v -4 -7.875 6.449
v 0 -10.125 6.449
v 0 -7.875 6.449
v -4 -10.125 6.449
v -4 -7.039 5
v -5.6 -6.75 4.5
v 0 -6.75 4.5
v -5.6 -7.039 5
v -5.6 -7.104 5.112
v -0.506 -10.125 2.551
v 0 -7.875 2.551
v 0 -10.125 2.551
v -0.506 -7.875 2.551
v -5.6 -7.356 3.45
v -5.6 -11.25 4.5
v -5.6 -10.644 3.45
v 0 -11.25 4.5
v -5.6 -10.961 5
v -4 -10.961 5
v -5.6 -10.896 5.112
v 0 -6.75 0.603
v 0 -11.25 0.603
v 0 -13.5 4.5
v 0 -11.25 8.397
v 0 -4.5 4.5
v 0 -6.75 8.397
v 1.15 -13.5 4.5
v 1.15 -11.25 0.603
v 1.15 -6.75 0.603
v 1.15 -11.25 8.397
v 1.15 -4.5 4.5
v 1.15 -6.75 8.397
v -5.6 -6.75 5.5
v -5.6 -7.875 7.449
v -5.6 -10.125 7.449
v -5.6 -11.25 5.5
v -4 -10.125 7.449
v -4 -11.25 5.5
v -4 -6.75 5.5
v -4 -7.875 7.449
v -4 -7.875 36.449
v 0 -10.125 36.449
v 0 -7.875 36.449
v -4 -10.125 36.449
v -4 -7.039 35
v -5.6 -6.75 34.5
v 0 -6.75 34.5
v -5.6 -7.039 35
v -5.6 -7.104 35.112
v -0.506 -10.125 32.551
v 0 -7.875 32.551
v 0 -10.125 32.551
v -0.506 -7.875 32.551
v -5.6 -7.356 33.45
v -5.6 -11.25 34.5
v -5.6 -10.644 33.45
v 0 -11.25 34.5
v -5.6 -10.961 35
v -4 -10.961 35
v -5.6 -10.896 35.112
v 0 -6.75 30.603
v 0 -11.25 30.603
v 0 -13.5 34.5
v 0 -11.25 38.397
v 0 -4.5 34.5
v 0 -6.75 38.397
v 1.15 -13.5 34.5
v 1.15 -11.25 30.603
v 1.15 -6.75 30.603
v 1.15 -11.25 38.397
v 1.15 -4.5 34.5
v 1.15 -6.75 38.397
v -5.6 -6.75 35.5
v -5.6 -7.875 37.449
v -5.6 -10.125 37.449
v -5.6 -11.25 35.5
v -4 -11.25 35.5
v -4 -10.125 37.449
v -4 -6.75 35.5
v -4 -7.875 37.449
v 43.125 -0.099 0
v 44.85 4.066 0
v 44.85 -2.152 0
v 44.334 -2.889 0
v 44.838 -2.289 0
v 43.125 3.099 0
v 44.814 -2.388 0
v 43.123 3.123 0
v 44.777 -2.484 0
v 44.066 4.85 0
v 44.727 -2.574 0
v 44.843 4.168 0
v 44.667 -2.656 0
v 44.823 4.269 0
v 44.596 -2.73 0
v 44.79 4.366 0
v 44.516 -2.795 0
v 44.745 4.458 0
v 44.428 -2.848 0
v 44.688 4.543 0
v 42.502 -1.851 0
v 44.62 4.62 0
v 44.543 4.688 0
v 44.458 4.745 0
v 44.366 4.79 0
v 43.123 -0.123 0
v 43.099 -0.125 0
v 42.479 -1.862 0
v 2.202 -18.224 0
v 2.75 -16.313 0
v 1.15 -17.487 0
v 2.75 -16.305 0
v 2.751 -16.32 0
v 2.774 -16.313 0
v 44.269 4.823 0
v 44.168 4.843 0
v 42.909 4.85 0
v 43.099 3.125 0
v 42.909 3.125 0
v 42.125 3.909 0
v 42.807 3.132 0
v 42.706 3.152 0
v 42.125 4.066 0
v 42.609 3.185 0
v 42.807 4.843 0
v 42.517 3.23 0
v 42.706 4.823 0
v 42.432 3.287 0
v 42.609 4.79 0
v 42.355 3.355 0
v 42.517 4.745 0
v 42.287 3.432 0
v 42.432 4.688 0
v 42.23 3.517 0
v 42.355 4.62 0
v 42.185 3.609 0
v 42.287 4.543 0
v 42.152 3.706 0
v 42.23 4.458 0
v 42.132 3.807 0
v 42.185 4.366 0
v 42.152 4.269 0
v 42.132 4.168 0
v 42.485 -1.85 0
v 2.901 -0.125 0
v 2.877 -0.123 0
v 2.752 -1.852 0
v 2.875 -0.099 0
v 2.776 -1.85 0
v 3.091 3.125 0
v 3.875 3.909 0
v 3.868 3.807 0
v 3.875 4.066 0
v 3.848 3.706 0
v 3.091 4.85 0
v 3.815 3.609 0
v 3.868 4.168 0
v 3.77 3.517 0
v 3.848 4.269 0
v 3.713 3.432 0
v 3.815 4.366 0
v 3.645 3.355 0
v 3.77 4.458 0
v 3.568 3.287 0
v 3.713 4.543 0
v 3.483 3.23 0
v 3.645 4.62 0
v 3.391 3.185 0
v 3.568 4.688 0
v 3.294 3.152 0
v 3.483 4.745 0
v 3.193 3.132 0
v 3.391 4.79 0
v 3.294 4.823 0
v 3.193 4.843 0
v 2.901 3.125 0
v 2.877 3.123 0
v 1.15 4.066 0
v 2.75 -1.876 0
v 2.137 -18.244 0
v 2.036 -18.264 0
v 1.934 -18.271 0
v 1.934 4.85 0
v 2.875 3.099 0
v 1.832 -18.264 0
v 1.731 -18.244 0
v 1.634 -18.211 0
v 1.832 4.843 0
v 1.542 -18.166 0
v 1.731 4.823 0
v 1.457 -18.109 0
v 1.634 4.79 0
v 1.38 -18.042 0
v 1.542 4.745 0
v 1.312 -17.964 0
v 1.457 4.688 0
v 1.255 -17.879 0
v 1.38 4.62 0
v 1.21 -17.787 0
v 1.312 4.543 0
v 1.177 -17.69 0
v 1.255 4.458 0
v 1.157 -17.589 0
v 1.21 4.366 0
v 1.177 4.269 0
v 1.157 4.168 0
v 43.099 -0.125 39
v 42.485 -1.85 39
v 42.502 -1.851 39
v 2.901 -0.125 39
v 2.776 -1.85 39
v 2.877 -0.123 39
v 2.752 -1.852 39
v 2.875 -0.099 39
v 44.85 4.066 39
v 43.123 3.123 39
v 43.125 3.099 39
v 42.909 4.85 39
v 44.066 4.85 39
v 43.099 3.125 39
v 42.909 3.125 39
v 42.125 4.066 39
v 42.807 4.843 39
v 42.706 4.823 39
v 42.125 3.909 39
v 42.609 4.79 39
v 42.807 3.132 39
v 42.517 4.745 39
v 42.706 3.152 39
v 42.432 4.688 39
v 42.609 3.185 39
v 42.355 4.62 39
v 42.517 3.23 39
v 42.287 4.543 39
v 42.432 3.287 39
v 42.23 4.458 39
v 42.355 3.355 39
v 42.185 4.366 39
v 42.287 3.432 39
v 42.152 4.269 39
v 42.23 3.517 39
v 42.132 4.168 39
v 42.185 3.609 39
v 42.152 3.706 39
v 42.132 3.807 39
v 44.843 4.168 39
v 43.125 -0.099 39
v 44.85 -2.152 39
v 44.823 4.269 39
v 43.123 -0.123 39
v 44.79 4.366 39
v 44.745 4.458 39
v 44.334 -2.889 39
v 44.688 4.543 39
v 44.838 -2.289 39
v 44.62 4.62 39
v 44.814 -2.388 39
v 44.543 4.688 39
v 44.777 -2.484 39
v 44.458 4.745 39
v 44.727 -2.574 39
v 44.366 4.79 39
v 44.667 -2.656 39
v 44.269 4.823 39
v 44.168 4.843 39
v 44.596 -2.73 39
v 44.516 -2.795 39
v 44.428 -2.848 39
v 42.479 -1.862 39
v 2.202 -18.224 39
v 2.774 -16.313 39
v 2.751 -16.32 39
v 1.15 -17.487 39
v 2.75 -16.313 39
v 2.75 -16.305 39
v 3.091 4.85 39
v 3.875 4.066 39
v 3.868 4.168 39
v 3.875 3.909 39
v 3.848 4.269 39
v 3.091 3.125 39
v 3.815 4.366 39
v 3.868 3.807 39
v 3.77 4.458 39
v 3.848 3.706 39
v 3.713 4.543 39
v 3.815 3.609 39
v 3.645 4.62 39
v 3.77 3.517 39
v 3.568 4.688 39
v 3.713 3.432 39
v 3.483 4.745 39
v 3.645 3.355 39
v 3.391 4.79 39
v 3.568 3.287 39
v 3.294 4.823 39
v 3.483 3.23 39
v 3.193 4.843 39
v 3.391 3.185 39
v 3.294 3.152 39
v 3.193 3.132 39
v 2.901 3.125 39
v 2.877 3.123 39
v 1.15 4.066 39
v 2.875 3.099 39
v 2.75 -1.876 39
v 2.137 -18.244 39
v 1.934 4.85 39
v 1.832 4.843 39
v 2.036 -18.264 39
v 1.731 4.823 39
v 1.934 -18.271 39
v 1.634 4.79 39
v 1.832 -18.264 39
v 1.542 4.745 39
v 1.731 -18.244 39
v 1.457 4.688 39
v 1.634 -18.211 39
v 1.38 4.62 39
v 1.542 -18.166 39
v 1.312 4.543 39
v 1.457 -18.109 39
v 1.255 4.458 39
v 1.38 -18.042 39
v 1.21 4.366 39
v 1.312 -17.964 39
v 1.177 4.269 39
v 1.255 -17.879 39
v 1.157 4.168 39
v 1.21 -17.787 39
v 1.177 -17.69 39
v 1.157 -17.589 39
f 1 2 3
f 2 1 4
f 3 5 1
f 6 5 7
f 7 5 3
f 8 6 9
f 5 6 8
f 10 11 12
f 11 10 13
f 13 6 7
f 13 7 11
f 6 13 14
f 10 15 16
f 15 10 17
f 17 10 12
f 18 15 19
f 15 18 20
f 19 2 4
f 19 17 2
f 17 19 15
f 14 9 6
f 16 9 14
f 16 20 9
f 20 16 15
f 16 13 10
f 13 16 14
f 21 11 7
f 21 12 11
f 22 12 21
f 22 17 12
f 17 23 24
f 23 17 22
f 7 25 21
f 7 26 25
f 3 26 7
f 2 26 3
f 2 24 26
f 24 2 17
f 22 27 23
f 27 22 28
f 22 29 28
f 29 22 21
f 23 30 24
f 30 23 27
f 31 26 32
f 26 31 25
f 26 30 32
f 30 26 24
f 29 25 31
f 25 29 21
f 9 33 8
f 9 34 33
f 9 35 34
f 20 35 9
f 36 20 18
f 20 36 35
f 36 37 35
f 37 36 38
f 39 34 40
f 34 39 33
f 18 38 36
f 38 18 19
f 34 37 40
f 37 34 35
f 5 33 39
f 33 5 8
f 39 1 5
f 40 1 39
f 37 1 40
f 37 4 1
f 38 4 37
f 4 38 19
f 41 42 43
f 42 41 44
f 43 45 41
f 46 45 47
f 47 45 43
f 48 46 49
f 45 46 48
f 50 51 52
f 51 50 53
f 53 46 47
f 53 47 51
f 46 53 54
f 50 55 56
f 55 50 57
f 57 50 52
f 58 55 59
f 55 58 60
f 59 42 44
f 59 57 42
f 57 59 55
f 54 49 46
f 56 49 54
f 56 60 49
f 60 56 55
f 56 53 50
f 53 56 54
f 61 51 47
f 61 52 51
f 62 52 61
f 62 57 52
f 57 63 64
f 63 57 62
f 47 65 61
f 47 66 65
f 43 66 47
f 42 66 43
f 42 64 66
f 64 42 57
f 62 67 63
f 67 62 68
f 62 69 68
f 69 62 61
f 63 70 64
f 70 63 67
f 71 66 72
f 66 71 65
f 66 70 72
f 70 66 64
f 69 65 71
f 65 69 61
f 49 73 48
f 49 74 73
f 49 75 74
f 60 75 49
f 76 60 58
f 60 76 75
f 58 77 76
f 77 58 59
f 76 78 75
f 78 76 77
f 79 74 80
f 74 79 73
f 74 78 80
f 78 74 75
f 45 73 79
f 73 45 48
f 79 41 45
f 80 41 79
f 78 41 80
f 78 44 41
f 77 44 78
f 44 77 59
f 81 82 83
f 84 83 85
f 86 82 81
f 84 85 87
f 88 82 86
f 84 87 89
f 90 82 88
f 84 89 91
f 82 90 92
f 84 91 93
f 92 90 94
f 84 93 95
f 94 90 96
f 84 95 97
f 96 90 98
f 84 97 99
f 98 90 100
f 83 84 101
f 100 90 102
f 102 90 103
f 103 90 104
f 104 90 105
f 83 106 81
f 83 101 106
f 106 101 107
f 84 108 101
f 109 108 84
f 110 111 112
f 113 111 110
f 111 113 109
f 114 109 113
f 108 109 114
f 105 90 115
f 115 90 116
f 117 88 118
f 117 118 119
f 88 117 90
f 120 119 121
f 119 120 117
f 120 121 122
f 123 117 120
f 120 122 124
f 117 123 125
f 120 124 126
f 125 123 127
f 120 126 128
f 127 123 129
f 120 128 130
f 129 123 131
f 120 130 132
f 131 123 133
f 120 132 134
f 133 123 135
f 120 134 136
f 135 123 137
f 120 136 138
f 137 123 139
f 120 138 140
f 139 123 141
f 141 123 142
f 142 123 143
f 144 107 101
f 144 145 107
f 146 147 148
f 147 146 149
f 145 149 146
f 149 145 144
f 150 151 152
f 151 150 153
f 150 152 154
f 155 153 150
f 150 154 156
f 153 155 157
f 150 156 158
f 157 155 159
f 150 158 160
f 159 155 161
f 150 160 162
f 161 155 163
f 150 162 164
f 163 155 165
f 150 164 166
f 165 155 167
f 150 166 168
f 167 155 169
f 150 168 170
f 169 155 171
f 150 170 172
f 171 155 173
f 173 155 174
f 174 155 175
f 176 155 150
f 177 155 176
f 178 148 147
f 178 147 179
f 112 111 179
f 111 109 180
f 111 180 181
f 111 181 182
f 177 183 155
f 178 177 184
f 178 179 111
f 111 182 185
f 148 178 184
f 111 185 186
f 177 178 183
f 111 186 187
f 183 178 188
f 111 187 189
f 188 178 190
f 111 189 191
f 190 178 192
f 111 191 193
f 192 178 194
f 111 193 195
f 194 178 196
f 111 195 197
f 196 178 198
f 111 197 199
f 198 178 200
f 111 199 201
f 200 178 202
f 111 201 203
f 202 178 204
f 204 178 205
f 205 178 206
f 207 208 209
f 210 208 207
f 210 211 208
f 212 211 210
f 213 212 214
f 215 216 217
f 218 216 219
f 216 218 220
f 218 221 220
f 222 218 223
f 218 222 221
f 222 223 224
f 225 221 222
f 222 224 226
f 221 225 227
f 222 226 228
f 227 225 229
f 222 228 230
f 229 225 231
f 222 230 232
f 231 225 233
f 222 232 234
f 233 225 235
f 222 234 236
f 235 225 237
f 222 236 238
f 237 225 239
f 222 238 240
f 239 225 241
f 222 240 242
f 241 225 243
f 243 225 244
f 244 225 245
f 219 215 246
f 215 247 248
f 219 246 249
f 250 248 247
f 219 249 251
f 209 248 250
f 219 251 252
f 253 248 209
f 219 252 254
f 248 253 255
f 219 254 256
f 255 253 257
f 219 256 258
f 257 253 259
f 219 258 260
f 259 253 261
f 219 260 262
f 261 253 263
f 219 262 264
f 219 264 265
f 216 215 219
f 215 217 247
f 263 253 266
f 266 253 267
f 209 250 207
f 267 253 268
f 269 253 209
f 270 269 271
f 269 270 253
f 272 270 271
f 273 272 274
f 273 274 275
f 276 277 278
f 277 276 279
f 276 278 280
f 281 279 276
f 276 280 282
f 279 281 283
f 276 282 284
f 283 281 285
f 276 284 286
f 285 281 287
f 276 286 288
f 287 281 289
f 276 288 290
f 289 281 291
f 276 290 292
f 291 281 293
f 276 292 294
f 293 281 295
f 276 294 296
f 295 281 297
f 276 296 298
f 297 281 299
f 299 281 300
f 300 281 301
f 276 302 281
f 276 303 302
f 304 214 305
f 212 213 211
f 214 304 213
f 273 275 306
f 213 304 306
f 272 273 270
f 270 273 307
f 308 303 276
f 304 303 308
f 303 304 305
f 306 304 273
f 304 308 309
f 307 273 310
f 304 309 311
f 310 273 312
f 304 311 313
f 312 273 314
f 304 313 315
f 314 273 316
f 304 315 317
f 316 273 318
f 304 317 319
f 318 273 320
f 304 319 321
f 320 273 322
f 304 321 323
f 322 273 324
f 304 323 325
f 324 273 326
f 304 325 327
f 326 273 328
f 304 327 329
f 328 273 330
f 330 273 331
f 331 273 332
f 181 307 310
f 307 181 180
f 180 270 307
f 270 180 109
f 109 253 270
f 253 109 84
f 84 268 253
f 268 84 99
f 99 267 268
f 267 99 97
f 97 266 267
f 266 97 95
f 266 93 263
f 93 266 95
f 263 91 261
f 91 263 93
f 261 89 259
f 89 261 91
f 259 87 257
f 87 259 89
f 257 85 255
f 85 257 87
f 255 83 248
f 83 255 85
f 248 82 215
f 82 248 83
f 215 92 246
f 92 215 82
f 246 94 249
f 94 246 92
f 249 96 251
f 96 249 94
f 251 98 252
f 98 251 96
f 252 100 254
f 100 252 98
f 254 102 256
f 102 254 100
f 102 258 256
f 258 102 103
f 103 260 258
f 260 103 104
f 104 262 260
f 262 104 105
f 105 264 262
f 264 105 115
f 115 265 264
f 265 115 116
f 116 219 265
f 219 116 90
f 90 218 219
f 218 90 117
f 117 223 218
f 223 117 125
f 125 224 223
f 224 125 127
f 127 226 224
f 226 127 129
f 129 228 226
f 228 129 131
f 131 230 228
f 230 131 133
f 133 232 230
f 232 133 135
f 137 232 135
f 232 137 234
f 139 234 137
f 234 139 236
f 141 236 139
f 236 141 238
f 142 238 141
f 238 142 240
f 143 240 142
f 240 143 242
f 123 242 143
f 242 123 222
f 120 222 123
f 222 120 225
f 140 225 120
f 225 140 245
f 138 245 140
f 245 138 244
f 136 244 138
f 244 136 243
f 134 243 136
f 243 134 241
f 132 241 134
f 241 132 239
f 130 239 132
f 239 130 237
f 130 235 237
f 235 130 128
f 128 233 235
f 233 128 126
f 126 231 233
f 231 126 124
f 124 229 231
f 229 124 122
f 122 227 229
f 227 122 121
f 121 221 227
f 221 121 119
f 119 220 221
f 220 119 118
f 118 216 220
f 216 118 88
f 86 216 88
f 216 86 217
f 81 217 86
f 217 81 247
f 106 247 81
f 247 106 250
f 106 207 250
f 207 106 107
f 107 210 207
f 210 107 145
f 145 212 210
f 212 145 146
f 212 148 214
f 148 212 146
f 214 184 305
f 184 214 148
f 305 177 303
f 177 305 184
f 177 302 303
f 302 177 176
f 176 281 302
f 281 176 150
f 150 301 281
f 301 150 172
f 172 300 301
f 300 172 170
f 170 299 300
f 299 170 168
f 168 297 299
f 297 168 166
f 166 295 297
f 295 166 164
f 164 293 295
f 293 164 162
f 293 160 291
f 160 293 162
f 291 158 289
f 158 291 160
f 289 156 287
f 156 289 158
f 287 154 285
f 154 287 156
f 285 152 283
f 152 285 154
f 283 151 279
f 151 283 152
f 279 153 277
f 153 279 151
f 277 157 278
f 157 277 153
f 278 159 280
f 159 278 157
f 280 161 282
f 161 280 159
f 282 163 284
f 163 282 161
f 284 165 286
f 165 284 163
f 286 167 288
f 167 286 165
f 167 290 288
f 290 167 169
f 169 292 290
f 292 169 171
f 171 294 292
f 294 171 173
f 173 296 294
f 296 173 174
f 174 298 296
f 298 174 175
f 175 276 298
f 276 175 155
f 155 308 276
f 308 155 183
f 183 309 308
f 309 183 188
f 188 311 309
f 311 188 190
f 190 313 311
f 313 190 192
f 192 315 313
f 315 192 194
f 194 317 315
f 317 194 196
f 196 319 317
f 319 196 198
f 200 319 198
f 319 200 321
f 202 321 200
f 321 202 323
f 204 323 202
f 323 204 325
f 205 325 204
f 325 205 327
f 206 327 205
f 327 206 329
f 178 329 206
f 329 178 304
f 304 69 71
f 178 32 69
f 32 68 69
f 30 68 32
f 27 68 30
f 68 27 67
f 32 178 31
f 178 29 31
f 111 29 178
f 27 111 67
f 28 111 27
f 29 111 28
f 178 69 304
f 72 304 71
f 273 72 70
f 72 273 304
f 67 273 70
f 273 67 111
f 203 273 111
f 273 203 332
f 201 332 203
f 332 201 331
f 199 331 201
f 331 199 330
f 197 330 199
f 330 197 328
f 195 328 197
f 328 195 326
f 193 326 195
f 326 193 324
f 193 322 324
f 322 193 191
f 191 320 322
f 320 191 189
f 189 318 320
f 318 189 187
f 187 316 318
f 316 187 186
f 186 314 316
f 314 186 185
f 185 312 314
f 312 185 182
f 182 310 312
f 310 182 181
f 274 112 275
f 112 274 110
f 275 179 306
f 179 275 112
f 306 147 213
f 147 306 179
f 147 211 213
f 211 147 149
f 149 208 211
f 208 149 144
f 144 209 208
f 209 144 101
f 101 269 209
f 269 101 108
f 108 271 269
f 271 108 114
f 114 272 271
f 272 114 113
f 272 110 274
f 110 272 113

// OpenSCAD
// Parameters

case_rot = [90, 0, 90];

pi_hook_r = 4.5 / 2;
pi_hook_depth = 3.5;
pi_hook_distance = 30;

// Dimensions

T = 0.5; // Tolerance offset
N = 0.4; // Nozzle diameter
L = N / 2; // Layer height
E = 0.01;
NEAR = 50;
FAR = 300;

dim_case = [61, 90, 22];

dim_printer_base = [FAR, FAR, NEAR];
dim_printer_frame = [40, 3, FAR];
dim_printer_bracket = [40, NEAR, 13];

offset_printer_frame = 3;
offset_printer_bracket = 40;

mount_thickness = N * 4;

// Modules

module case() {
    color("#aaaaff55")
    rotate(case_rot)
        cube(dim_case, center = true);
}

module printer() {
    module base() {
        cube(dim_printer_base);
    }

    module frame() {
        cube(dim_printer_frame);
    }

    module bracket() {
        cube(dim_printer_bracket);
    }

    color("#aaaaaacc") {
        translate([0, - dim_printer_base.y / 2, - dim_printer_base.z])
            base();

        translate([offset_printer_frame, 0, 0])
            frame();

        translate([offset_printer_frame, dim_printer_frame.y, offset_printer_bracket])
            bracket();
    }
}

module frame_mount() {
    $fn = 48;

    snap_width = dim_printer_frame.x + mount_thickness * 2 + T;
    snap_depth = dim_printer_frame.y + mount_thickness * 2 + T;
    snap_grip = 1;

    module snap_section() {
        offset(mount_thickness * 0.49)
        offset(- mount_thickness * 0.49) {
            difference() {
                square([snap_width, snap_depth], center = true);
                square([dim_printer_frame.x, dim_printer_frame.y] + [T, T] / 2, center = true);
                translate([0, mount_thickness])
                    square([dim_printer_frame.x + T / 2 - snap_grip * 2, dim_printer_frame.y + T / 2 + mount_thickness], center = true);
            }

            triangle_angle = 20;
            triangle_extent = snap_width * tan(triangle_angle);
            triangle_diagonal = snap_width / cos(triangle_angle);

            translate([(mount_thickness - snap_width) / 2, - (triangle_extent + snap_depth) / 2 + E])
                square([mount_thickness, triangle_extent], center = true);

            intersection() {
                translate([0, - (triangle_extent + snap_depth) / 2])
                rotate(90 + triangle_angle)
                    square([mount_thickness, triangle_diagonal], center = true);

                // Cut off the bits that stick out
                square([snap_width, 10 ^ 3], center = true);
            }
        }
    }

    module snap() {
        translate([
            offset_printer_frame + dim_printer_frame.x / 2,
            dim_printer_frame.y / 2,
            0,
        ])
        linear_extrude(offset_printer_bracket - 1, convexity = 4)
            snap_section();
    }

    module hook() {
        translate([offset_printer_frame - T, 0, 0])
        rotate([0, 90, 0])
        rotate([180, 0, 30])
            cylinder(offset_printer_frame - T, r = pi_hook_r * 2, $fn = 6);

        translate([offset_printer_frame - mount_thickness, 0, 0])
        rotate([0, 90, 0])
        rotate([180, 0, 90])
        intersection() {
            height = pi_hook_depth + T + offset_printer_frame;

            cylinder(height, r = pi_hook_r, $fn = 6);

            rotate([10, 0, 0])
            translate([0, 0, height / 2])
                cube([pi_hook_r * 2, pi_hook_r * 2, height], center = true);
        }

        translate([- (pi_hook_depth + T), 0, 1])
        rotate([0, 90, 0])
        rotate([180, 0, 30])
            cylinder(mount_thickness, r = pi_hook_r, $fn = 6);
    }

    snap();

    translate([0, -9, 4.5]) {
        hook();

        translate([0, 0, pi_hook_distance])
            hook();
    }
}

module assembly() {
    %printer();

    translate([- dim_case.x / 2, 0, 0])
        %case();

    frame_mount();
}

assembly();
